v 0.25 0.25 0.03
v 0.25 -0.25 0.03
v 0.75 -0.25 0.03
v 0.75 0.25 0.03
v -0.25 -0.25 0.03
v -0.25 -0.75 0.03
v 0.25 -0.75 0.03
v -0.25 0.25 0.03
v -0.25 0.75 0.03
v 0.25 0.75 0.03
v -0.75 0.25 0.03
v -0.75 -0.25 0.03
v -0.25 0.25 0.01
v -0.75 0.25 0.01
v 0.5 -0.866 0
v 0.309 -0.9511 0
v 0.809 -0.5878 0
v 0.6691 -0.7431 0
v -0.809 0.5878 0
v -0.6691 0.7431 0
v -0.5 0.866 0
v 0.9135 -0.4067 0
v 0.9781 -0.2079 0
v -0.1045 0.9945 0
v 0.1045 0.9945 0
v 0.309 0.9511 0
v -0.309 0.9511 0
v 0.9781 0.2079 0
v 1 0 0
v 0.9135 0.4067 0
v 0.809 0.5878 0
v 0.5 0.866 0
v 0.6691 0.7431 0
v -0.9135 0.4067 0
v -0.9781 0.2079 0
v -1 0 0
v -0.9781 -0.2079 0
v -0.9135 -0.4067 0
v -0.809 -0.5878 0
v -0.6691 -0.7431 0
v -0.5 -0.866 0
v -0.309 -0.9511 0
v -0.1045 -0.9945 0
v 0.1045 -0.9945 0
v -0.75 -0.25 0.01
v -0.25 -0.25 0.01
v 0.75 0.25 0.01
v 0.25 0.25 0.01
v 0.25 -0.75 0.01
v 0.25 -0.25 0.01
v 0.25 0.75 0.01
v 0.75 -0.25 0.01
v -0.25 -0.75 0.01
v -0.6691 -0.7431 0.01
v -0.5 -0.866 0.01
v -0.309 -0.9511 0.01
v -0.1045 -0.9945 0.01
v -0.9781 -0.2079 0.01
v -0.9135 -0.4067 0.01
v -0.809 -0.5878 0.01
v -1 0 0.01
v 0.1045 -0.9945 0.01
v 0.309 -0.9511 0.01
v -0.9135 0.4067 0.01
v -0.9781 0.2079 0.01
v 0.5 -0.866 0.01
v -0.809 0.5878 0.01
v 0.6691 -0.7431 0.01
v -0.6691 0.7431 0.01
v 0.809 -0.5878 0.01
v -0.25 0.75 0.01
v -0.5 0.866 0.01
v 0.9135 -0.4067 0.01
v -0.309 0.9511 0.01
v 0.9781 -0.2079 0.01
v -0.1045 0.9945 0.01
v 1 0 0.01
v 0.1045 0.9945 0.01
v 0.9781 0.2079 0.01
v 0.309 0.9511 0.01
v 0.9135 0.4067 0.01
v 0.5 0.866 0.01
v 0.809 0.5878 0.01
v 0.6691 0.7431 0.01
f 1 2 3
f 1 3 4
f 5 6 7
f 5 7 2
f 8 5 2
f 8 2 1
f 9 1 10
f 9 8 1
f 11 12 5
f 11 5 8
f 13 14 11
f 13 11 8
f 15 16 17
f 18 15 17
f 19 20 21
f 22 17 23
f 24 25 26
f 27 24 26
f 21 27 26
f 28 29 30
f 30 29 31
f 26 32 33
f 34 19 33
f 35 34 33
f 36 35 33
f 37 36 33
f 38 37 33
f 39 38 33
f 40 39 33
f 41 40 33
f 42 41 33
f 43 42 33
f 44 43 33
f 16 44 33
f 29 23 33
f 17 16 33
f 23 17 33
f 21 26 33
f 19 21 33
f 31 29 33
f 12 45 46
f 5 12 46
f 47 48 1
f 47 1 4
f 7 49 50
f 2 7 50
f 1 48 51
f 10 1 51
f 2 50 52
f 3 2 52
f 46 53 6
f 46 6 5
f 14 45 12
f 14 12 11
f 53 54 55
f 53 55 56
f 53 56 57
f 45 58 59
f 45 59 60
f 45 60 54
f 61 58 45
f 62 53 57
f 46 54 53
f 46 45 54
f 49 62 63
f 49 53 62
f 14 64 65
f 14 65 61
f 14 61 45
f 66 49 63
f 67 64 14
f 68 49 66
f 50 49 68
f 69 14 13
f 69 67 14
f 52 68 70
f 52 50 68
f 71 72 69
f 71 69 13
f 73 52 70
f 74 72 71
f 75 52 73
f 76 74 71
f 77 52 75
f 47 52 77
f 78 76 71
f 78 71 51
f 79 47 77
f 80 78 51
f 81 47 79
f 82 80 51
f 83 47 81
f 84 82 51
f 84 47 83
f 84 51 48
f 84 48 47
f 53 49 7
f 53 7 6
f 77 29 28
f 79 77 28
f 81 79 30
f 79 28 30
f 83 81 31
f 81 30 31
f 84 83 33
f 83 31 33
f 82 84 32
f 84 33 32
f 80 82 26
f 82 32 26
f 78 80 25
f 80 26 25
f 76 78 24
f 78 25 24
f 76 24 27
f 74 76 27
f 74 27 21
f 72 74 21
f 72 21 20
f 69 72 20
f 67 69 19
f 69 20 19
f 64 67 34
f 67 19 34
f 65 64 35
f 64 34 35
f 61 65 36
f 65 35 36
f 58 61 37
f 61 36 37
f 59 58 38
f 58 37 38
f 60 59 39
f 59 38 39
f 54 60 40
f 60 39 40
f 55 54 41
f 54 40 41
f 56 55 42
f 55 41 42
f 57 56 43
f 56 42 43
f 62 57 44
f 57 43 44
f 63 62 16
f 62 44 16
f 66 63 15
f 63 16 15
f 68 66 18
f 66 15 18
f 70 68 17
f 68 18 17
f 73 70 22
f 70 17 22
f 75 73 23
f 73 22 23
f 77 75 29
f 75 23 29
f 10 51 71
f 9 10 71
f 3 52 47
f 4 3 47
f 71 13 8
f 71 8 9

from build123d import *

# Parameters (mm, degrees)
CYLINDER_R             = 1
CYLINDER_DEPTH         = 0.01
BOX001_W               = 1.5
BOX001_H               = 0.5
BOX001_DEPTH           = 0.03
BOX001_PLACEMENT_ANGLE = 90
BOX_W                  = 1.5
BOX_H                  = 0.5
BOX_DEPTH              = 0.03


with BuildPart() as loetstop:
    # Cylinder → Cylinder (new body)
    with BuildSketch(Plane.XY):
        Circle(CYLINDER_R)
    extrude(amount=CYLINDER_DEPTH)


with BuildPart() as box001:
    # Box001 → Box001 (new body)
    with BuildSketch(Plane.XY):
        with Locations((0.75, 0.25)):
            Rectangle(BOX001_W, BOX001_H)
    extrude(amount=BOX001_DEPTH)


with BuildPart() as box001_1:
    # Box001 placement: moved
    add(box001.part.moved(Location((0.25, -0.75, 0))).rotate(Axis((0.25, -0.75, 0), (0, 0, 1)), BOX001_PLACEMENT_ANGLE))


with BuildPart() as fid150x200cross:
    # Box → Box (new body)
    with BuildSketch(Plane(origin=(-0.75, -0.25, 0), x_dir=(1, 0, 0), z_dir=(0, 0, 1))):
        with Locations((0.75, 0.25)):
            Rectangle(BOX_W, BOX_H)
    extrude(amount=BOX_DEPTH)

    # Fusion: union Box001
    add(box001_1.part)

    # Fusion001: union Loetstop
    add(loetstop.part)


solid = fid150x200cross.part
